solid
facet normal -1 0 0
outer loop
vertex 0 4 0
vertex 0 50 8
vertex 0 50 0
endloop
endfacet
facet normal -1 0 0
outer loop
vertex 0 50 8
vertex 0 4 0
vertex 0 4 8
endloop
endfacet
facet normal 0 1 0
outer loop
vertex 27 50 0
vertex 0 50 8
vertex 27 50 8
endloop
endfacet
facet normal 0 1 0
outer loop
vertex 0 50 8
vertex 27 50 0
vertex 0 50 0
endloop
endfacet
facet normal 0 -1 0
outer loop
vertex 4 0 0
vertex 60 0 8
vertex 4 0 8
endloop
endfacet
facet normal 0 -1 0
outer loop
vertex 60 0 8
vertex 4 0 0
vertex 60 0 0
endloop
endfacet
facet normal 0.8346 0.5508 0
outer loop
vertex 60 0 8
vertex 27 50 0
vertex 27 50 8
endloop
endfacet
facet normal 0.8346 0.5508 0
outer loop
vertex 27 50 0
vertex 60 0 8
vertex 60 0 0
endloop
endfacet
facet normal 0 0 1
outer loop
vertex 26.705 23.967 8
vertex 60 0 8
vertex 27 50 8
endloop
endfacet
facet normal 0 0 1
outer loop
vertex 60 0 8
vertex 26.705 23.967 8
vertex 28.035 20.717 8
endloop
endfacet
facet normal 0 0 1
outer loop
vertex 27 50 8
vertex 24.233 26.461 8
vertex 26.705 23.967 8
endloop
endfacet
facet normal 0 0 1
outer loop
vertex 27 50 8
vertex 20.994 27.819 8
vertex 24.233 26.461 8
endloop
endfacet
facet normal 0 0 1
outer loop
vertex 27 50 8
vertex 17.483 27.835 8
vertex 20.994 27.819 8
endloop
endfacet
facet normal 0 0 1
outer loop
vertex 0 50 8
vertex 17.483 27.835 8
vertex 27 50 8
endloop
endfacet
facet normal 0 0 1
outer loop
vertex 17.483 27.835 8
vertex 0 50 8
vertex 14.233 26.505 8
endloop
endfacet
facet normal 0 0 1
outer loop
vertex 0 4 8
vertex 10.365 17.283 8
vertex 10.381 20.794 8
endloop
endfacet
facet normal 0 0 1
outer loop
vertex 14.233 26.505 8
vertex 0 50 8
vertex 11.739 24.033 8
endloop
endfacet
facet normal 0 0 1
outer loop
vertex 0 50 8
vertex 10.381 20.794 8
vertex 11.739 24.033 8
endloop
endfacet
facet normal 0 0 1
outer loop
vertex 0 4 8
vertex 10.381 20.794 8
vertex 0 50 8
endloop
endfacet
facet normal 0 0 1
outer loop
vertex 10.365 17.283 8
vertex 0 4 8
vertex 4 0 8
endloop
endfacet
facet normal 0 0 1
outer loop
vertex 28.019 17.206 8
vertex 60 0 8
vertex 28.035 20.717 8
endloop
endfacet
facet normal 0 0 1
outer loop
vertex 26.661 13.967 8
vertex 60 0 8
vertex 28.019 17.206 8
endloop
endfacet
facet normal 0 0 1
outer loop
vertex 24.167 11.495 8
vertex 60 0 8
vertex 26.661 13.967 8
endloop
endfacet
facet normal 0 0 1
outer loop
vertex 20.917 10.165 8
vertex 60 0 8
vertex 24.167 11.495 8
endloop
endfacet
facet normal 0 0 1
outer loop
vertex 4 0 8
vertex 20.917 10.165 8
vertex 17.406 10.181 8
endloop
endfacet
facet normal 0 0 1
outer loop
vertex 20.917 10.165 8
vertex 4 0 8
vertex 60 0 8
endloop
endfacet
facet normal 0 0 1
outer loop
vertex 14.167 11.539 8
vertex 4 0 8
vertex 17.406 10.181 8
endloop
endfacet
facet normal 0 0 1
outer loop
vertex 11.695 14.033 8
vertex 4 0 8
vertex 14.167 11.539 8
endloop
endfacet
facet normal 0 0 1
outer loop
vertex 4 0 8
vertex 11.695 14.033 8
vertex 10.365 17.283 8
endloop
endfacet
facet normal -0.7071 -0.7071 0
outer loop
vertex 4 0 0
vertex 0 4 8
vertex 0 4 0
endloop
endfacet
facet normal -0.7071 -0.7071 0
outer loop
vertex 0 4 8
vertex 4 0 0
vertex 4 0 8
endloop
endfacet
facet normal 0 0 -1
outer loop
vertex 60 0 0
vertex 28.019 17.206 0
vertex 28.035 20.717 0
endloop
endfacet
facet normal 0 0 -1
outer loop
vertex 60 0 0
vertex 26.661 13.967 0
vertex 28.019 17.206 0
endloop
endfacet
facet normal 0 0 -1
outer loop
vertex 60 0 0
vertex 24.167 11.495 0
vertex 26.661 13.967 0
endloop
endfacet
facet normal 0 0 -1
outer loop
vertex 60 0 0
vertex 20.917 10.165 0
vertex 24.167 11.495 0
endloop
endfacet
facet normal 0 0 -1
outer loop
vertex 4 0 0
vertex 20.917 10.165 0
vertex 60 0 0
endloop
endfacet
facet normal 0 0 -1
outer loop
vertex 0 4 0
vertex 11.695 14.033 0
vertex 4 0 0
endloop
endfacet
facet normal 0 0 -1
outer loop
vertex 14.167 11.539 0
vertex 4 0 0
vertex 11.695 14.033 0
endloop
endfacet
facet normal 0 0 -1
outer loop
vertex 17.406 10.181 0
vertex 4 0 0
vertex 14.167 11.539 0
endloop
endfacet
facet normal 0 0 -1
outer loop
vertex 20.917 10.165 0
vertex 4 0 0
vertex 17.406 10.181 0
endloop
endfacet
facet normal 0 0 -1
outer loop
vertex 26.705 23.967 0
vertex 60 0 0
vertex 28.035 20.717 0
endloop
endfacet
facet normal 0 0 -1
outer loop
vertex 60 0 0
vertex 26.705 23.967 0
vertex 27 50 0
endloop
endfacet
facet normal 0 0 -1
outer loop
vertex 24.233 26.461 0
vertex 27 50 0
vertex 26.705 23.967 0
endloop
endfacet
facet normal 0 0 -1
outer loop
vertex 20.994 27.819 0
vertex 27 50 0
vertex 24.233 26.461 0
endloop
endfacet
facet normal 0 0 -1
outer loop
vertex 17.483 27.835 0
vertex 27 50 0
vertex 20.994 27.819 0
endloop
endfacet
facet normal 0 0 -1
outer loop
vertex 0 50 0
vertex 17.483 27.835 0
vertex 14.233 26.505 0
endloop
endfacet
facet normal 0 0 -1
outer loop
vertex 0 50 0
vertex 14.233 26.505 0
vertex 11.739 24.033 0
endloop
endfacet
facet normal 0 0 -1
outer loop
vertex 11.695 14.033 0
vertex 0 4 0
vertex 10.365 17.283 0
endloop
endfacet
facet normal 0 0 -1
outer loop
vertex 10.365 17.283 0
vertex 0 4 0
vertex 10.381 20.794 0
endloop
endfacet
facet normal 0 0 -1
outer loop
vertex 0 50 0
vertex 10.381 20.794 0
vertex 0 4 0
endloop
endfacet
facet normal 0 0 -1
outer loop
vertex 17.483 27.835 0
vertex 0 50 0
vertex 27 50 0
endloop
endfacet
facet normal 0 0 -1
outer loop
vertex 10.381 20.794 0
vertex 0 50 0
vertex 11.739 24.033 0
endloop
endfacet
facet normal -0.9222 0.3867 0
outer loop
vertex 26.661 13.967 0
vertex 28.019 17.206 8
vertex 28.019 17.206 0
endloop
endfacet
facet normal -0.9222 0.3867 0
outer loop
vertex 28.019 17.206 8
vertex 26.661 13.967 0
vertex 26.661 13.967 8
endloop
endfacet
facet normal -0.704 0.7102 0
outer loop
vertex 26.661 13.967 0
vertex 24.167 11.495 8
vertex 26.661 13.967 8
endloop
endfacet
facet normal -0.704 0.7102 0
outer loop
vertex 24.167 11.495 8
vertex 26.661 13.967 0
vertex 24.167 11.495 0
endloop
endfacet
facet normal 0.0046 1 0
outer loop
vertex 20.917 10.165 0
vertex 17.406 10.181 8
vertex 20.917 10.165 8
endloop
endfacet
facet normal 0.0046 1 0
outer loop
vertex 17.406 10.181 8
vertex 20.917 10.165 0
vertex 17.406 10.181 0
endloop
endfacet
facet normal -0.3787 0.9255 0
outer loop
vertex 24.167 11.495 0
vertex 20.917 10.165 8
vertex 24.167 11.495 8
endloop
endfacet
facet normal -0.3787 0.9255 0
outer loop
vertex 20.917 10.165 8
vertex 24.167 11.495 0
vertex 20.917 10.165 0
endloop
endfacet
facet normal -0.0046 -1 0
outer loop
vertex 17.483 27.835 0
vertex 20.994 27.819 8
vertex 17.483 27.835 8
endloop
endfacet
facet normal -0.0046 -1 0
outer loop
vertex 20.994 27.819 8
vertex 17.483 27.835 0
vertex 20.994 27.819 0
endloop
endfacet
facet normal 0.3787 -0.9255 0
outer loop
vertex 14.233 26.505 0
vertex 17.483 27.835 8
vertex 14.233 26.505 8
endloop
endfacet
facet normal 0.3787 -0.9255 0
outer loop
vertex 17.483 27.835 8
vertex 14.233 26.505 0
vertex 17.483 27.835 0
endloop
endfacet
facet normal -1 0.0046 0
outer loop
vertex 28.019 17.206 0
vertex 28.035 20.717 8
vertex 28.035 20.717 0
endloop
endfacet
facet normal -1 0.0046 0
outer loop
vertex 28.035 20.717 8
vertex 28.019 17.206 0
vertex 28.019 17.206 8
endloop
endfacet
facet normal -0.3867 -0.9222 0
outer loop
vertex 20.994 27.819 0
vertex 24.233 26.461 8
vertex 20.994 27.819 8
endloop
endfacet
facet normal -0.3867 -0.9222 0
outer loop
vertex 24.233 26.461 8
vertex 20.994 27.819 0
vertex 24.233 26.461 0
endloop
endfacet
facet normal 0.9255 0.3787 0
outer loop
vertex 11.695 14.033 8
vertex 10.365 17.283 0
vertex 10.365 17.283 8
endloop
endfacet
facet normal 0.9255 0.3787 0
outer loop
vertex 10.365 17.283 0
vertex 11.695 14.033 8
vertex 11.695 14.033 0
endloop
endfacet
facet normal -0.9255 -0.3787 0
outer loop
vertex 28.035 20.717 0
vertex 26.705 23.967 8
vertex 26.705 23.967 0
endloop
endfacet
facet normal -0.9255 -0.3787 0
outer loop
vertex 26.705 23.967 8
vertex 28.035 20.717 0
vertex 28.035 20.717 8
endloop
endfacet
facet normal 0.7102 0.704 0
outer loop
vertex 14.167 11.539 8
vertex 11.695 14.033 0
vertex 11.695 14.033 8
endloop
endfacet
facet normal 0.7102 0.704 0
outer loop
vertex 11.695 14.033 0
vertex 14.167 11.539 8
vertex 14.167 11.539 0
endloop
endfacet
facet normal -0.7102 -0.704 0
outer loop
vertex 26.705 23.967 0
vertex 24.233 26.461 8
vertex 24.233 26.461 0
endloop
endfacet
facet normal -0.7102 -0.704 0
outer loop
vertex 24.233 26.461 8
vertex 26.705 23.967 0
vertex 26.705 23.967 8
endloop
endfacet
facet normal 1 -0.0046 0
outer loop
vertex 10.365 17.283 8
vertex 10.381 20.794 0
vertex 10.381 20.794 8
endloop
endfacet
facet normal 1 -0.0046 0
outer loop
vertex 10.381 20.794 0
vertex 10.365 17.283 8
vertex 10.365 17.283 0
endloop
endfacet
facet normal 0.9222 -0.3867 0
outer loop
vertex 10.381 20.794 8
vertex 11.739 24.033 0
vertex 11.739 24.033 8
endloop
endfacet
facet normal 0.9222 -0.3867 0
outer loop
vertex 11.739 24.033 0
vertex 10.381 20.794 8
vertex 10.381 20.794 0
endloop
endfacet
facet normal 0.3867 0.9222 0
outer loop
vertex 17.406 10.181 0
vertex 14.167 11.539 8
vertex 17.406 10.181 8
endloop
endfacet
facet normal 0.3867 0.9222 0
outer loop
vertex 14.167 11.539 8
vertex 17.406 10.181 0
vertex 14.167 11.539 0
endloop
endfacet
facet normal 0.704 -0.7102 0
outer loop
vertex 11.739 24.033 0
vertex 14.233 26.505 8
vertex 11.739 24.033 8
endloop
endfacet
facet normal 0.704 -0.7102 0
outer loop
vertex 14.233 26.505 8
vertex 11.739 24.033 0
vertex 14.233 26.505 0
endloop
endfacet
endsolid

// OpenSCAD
$fn = 32;

// ----------------------------------------------------------------------
// Bracket plate: gusset 60 x 50
// ----------------------------------------------------------------------

// --- parameters (mm) ---
hole_r = 3.5;             // bolt hole radius
plate_t = 8;              // plate thickness, Z (extrusion height)
gus_a = 60;               // base length
gus_b = 50;               // height
top_x = 27;               // top edge X of the angled cut
light_r = 9;              // lightening hole radius

light_d = 2 * light_r;

profile = [[4, 0], [30, 0], [60, 0], [27, 50], [0, 50], [0, 4]];  // primary outline, 6 points, counter clockwise
void_1 = [[28.035, 20.717], [26.705, 23.967], [24.233, 26.461], [20.994, 27.819], [17.483, 27.835], [14.233, 26.505], [11.739, 24.033], [10.381, 20.794], [10.365, 17.283], [11.695, 14.033], [14.167, 11.539], [17.406, 10.181], [20.917, 10.165], [24.167, 11.495], [26.661, 13.967], [28.019, 17.206]];  // lightening hole, 16 points

// --- the one profile operation ---
difference() {
  linear_extrude(height = plate_t) polygon(points = profile);
  translate([0, 0, -1])
    linear_extrude(height = plate_t + 2) polygon(points = void_1);
}
